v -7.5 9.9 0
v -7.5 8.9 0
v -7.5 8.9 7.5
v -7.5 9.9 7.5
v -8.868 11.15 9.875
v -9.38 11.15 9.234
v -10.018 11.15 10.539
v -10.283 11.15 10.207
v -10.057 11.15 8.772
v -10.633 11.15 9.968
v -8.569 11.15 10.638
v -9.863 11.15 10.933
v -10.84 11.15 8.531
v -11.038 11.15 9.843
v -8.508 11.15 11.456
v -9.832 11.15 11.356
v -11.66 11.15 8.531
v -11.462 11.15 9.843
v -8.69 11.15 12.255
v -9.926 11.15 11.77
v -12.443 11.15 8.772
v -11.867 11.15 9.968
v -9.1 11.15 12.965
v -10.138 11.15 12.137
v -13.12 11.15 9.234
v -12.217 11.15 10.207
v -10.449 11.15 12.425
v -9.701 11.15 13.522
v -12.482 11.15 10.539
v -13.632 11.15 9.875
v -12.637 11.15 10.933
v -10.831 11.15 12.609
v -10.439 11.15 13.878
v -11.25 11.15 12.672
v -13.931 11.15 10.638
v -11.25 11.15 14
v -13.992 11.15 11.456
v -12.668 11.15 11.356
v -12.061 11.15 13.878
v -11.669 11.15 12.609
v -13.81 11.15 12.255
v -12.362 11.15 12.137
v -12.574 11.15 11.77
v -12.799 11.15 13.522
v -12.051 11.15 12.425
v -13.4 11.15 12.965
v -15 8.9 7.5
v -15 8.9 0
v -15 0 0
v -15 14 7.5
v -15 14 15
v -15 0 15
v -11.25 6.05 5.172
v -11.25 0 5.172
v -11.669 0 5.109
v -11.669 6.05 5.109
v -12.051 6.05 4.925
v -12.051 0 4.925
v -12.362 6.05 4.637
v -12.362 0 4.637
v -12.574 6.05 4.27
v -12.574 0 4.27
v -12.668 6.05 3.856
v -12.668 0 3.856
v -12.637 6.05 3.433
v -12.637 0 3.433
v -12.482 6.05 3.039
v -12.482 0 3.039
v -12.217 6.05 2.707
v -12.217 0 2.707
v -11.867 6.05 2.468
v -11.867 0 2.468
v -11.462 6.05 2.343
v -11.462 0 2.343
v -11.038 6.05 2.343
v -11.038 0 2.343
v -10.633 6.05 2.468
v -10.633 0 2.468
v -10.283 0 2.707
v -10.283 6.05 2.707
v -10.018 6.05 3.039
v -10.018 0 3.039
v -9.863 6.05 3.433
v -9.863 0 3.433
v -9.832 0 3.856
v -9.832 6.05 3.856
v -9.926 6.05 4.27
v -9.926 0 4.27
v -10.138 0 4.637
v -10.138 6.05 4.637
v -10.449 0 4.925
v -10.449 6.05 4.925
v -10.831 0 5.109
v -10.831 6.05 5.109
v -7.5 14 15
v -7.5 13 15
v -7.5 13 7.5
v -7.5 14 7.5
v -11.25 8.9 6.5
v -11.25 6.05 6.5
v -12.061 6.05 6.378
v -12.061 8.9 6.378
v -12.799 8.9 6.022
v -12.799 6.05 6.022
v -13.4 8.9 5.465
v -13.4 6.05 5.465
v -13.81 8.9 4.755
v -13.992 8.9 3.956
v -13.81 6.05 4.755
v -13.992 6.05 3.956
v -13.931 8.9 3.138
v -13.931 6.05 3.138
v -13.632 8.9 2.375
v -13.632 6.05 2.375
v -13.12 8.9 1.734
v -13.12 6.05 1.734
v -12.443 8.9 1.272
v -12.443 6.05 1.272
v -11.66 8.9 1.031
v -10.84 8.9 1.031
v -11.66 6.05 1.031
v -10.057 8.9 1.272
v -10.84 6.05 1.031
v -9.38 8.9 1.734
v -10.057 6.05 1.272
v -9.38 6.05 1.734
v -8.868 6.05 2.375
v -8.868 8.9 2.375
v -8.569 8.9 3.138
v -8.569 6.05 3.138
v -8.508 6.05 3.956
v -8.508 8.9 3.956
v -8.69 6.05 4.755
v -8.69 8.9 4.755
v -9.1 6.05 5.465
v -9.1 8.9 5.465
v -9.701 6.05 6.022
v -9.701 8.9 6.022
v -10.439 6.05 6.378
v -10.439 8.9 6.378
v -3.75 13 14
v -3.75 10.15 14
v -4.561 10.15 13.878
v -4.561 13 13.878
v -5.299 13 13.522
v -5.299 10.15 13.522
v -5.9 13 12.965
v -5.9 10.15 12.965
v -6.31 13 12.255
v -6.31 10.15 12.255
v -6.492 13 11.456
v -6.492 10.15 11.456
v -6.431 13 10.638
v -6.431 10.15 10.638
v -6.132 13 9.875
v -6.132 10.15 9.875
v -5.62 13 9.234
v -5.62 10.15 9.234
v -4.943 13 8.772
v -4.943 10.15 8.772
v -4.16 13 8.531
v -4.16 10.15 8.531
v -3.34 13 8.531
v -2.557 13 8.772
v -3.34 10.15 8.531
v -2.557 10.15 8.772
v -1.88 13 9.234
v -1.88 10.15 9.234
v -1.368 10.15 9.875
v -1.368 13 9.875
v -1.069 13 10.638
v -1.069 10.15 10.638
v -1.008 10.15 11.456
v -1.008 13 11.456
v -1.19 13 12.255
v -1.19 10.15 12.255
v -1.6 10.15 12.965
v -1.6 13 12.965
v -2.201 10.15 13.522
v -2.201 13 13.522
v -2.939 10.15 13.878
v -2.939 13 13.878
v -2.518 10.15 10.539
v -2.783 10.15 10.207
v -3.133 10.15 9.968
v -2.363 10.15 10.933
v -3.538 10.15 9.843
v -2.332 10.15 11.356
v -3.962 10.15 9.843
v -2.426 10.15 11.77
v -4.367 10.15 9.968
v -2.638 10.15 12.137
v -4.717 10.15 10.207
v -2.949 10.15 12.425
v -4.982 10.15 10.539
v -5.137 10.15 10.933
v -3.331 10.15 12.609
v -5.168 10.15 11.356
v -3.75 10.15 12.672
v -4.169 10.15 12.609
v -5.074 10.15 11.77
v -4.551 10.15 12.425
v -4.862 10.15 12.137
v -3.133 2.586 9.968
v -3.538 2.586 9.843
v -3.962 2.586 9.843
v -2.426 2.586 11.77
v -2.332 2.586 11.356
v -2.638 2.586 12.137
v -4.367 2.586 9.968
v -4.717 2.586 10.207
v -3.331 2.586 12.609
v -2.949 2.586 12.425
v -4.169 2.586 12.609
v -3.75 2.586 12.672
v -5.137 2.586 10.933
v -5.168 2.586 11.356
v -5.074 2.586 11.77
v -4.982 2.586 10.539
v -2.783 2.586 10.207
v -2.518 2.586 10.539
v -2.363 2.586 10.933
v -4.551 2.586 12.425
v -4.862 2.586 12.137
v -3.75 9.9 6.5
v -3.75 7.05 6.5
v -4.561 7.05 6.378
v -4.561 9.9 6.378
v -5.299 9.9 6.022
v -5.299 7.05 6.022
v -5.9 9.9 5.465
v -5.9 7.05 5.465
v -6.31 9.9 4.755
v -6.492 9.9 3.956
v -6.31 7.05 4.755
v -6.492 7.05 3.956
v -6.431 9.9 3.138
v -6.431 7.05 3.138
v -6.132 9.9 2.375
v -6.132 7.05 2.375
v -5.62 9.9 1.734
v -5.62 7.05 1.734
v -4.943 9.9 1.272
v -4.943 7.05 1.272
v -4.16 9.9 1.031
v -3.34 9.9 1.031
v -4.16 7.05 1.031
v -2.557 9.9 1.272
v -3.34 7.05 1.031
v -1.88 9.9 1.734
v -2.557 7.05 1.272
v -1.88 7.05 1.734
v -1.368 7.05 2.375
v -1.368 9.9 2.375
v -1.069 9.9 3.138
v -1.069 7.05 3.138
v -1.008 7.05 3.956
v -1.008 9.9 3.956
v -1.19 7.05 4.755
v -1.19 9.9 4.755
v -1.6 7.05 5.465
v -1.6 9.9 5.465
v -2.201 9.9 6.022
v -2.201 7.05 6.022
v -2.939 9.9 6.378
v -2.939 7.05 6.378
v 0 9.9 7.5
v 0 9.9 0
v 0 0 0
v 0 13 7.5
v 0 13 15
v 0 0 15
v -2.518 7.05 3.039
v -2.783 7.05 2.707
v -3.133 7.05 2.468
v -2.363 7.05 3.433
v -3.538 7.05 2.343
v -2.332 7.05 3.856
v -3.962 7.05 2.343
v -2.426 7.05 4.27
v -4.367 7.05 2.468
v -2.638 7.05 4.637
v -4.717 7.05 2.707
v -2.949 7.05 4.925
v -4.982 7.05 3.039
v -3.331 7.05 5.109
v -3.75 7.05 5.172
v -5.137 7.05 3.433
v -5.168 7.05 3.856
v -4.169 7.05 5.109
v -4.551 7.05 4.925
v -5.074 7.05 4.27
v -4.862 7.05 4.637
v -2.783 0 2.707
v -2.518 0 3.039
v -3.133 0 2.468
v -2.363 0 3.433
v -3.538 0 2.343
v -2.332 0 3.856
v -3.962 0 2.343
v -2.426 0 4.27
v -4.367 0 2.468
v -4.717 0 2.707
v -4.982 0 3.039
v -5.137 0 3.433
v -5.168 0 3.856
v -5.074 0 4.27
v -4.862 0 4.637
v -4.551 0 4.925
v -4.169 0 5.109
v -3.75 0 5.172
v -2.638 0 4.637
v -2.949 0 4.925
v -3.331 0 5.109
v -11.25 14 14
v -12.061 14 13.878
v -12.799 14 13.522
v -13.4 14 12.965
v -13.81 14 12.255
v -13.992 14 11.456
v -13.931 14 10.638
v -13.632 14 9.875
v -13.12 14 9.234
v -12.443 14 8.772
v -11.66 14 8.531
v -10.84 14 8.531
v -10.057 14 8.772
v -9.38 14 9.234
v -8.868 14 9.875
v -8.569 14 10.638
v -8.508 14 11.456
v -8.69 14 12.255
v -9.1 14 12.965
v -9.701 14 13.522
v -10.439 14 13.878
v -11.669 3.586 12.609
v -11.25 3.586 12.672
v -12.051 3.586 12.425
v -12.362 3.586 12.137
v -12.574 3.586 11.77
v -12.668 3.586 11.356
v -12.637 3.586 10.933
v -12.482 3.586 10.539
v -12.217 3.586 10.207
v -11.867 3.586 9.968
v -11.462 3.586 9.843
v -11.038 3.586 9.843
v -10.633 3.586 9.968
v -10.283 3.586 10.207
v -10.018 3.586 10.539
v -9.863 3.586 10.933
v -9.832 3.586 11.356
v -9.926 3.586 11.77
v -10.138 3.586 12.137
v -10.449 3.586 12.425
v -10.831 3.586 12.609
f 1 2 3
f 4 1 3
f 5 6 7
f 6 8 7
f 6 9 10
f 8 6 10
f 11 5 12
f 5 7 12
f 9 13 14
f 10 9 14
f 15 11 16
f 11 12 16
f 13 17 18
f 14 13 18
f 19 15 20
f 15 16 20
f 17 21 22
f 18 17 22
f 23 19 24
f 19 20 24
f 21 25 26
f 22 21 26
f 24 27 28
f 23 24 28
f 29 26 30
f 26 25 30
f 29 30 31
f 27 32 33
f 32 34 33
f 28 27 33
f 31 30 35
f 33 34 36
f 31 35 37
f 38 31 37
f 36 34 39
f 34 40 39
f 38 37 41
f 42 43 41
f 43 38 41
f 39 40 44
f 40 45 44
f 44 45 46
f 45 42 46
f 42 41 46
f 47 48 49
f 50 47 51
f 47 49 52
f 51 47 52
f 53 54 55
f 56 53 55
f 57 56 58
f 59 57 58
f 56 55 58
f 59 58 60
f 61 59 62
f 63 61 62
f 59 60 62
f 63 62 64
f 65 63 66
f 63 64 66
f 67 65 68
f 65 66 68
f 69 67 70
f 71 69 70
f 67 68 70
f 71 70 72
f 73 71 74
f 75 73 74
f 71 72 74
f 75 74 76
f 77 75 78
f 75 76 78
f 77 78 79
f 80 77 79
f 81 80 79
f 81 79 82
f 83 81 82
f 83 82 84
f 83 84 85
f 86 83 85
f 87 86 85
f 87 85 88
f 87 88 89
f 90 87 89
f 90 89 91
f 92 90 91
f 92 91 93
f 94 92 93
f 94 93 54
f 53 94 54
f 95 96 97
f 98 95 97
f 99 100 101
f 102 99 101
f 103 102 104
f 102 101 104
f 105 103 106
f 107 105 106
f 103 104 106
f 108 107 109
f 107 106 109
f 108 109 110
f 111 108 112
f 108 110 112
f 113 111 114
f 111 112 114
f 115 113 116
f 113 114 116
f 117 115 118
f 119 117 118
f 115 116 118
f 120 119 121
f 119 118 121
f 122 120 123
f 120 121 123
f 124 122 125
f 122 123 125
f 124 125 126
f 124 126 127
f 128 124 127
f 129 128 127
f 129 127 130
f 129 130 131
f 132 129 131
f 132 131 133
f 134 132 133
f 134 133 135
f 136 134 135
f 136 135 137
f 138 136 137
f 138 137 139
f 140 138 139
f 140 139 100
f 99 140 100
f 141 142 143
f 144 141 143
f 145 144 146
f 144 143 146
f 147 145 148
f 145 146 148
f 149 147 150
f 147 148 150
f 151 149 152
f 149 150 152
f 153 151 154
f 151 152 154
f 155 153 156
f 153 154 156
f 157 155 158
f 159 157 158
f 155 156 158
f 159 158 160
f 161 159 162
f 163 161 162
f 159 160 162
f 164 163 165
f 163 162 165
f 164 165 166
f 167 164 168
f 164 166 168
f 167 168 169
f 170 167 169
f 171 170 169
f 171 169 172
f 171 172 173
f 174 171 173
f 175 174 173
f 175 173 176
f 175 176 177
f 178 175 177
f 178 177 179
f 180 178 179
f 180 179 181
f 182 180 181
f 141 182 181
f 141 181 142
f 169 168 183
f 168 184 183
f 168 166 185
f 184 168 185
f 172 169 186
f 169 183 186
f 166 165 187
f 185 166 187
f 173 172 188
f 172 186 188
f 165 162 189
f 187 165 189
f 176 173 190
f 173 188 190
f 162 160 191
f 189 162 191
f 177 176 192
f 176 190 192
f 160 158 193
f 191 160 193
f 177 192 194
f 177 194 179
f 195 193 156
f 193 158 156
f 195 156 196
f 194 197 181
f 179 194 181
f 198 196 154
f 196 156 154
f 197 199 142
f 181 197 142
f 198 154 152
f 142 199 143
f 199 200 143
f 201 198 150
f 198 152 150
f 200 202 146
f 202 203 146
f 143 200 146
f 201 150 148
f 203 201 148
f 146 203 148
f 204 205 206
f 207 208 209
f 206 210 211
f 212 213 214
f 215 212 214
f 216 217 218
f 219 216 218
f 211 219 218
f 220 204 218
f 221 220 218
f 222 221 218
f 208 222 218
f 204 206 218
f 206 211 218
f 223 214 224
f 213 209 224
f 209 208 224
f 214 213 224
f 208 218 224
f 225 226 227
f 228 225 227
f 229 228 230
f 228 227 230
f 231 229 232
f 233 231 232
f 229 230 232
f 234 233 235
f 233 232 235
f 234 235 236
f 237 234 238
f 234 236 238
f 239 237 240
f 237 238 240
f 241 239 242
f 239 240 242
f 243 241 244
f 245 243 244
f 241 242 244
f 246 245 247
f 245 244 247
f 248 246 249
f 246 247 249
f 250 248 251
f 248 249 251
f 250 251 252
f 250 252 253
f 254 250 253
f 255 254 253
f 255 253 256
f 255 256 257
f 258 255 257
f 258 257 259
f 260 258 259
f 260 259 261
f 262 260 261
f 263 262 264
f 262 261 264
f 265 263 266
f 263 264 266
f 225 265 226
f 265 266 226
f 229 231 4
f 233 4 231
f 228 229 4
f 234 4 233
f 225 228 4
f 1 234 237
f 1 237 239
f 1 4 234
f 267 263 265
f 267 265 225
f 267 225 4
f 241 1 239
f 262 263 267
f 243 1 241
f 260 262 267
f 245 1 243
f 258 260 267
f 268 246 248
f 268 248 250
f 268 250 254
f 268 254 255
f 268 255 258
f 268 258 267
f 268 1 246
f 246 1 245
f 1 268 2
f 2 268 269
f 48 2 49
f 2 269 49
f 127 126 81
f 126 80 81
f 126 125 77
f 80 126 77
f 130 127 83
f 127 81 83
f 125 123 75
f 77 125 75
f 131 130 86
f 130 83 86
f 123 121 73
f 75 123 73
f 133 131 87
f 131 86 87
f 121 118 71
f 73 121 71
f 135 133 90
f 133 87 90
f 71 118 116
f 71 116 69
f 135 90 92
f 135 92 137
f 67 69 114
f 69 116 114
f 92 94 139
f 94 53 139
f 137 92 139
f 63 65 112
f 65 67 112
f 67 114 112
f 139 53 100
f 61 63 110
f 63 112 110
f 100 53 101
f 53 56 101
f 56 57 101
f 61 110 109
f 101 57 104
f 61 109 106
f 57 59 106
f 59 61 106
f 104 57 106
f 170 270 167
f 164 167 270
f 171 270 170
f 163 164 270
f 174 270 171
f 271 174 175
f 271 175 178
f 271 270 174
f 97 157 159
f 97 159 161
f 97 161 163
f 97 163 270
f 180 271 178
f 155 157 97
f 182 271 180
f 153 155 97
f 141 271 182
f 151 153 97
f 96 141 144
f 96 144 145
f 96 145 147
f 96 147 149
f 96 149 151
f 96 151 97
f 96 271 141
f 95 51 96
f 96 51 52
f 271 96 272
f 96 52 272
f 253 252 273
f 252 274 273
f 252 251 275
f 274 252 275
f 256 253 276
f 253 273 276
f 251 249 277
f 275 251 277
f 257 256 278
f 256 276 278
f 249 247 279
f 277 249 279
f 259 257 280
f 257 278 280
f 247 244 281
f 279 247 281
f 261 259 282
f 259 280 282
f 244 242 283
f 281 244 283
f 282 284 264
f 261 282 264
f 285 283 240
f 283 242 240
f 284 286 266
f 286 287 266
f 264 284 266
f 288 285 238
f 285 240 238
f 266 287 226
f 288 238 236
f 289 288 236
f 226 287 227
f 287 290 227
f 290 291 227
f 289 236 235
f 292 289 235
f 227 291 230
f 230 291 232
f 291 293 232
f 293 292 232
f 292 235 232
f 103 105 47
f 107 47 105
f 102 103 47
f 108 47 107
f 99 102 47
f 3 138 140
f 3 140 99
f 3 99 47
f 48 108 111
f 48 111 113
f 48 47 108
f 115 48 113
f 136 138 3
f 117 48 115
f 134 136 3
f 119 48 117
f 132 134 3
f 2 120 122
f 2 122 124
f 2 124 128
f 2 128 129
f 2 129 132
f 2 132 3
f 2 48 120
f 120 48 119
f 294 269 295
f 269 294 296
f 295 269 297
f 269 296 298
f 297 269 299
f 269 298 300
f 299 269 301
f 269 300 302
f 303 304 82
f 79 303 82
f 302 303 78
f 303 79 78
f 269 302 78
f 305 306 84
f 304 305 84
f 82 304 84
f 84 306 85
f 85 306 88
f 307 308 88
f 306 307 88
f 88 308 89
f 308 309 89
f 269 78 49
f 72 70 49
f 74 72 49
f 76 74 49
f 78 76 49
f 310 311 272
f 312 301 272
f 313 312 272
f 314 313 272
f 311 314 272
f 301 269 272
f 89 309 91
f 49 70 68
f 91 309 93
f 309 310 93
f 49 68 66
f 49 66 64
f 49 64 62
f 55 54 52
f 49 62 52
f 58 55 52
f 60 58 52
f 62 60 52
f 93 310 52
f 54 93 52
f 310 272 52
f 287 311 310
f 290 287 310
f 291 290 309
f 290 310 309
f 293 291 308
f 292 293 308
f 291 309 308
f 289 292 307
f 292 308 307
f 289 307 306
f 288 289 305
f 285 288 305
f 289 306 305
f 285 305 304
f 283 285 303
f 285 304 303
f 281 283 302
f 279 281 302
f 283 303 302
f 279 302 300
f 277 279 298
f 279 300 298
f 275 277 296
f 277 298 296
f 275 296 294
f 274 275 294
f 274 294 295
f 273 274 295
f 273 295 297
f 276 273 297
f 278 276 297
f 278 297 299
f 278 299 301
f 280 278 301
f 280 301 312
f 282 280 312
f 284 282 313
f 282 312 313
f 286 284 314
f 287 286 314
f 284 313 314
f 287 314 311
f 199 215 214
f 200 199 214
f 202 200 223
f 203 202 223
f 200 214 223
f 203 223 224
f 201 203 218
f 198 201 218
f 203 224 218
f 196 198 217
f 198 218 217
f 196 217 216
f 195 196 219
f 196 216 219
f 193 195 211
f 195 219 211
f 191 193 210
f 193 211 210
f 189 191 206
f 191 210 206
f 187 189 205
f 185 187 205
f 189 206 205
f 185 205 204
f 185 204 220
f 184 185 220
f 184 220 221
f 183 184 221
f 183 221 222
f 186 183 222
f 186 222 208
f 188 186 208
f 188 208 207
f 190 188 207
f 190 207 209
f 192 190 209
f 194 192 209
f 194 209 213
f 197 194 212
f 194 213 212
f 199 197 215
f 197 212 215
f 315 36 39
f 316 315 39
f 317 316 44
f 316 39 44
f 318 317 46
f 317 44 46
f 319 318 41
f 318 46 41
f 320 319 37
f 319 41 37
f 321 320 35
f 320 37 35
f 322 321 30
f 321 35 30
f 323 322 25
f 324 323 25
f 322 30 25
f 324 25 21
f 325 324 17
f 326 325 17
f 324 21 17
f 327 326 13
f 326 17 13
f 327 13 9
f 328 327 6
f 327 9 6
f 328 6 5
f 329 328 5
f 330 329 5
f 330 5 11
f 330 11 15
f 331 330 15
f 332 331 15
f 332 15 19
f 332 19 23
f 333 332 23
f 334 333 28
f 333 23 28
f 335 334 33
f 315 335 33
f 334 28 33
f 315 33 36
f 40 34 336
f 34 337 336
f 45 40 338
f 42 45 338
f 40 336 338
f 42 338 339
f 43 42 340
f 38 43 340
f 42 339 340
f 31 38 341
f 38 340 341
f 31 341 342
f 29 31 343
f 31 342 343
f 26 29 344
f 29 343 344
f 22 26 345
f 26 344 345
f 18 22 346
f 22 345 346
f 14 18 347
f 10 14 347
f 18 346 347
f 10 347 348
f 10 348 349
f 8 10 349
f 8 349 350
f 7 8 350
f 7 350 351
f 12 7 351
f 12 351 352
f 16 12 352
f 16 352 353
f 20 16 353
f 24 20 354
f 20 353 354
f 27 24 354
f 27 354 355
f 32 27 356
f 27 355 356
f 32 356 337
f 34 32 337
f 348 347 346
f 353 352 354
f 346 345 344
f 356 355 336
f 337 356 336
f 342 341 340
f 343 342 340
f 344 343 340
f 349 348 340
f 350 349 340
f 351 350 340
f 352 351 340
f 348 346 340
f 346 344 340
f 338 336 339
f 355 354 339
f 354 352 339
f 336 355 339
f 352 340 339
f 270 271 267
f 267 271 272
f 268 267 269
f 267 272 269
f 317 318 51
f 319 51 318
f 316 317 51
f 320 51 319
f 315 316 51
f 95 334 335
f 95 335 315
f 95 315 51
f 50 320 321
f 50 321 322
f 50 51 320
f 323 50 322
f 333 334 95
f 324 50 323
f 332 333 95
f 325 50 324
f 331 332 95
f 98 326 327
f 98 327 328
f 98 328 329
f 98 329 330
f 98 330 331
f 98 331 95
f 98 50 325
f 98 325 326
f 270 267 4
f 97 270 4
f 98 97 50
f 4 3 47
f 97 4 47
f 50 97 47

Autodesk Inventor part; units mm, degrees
ref_plane "YZ Plane" through (0, 0, 0) normal (1, 0, 0) x (0, 1, 0)
ref_plane "XZ Plane" through (0, 0, 0) normal (0, 1, 0) x (-1, 0, 0)
ref_plane "XY Plane" through (0, 0, 0) normal (0, 0, 1) x (1, 0, 0)
sketch "Sketch1" plane through (0, 0, 0) normal (0, 1, 0) x (-1, 0, 0)
  line L0 (15, 15) -> (0, 15)
  line L1 (0, 15) -> (0, 0)
  line L2 (0, 0) -> (15, 0)
  line L3 (15, 0) -> (15, 15)
  dimension "d0" = 15
  dimension "d1" = 15
extrude "Extrusion1" add sketch "Sketch1" along normal blind 13
sketch "Sketch2" plane through (0, 13, 0) normal (0, 1, 0) x (1, 0, 0)
  line L0 (-15, -15) -> (0, -15) construction
  line L1 (0, -15) -> (0, 0) construction
  line L2 (0, 0) -> (-15, 0) construction
  line L3 (-15, 0) -> (-15, -15) construction
  line L4 (-15, 0) -> (-15, -15) construction
  line L5 (-15, -7.5) -> (0, -7.5) construction
  line L6 (-15, -7.5) -> (0, -7.5)
  line L7 (0, -7.5) -> (0, 0)
  line L8 (0, 0) -> (-15, 0)
  line L9 (-15, 0) -> (-15, -7.5)
extrude "Extrusion2" cut sketch "Sketch2" against normal blind 4.1
sketch "Sketch3" plane through (0, 13, 0) normal (0, 1, 0) x (1, 0, 0)
  line L0 (0, -7.5) -> (-15, -7.5) construction
  line L1 (-15, -7.5) -> (-15, -15) construction
  line L2 (-15, -15) -> (0, -15) construction
  line L3 (0, -15) -> (0, -7.5) construction
  line L4 (-15, -15) -> (0, -15) construction
  line L5 (-7.5, -15) -> (-7.5, -7.5) construction
  line L6 (-15, -15) -> (-7.5, -15)
  line L7 (-7.5, -15) -> (-7.5, -7.5)
  line L8 (-7.5, -7.5) -> (-15, -7.5)
  line L9 (-15, -7.5) -> (-15, -15)
  point P0 (0, 0)
extrude "Extrusion3" add sketch "Sketch3" along normal blind 1
sketch "Sketch4" plane through (0, 8.9, 0) normal (0, 1, 0) x (1, 0, 0)
  line L0 (0, 0) -> (0, -7.5) construction
  line L1 (-15, 0) -> (0, 0) construction
  line L2 (-15, -7.5) -> (-15, 0) construction
  line L3 (0, -7.5) -> (-15, -7.5) construction
  line L4 (-7.5, -7.5) -> (-7.5, 0) construction
  line L5 (-7.5, -7.5) -> (0, -7.5)
  line L6 (0, -7.5) -> (0, 0)
  line L7 (0, 0) -> (-7.5, 0)
  line L8 (-7.5, 0) -> (-7.5, -7.5)
extrude "Extrusion4" add sketch "Sketch4" along normal blind 1
sketch "Sketch5" plane through (0, 14, 0) normal (0, 1, 0) x (1, 0, 0)
  line L0 (-15, -15) -> (-7.5, -15) construction
  line L1 (-7.5, -15) -> (-7.5, -7.5) construction
  line L2 (-7.5, -7.5) -> (-15, -7.5) construction
  line L3 (-15, -7.5) -> (-15, -15) construction
  point P0 (0, 0)
  point P1 (-11.25, -11.25)
  point P2 (-11.25, -11.25)
sketch "Sketch6" plane through (0, 13, 0) normal (0, 1, 0) x (1, 0, 0)
  line L0 (-7.5, -7.5) -> (-7.5, -15) construction
  line L1 (-7.5, -15) -> (0, -15) construction
  line L2 (0, -15) -> (0, -7.5) construction
  line L3 (0, -7.5) -> (-7.5, -7.5) construction
  point P0 (0, 0)
  point P1 (-3.75, -11.25)
sketch "Sketch7" plane through (0, 9.9, 0) normal (0, 1, 0) x (1, 0, 0)
  line L0 (0, -7.5) -> (0, 0) construction
  line L1 (0, 0) -> (-7.5, 0) construction
  line L2 (-7.5, 0) -> (-7.5, -7.5) construction
  line L3 (0, -7.5) -> (-7.5, -7.5) construction
  point P0 (-3.75, -3.75)
sketch "Sketch8" plane through (0, 8.9, 0) normal (0, 1, 0) x (1, 0, 0)
  line L0 (-7.5, -7.5) -> (-7.5, 0) construction
  line L1 (-15, 0) -> (-7.5, 0) construction
  line L2 (-15, -7.5) -> (-15, 0) construction
  line L3 (-7.5, -7.5) -> (-15, -7.5) construction
  point P0 (0, 0)
  point P1 (-11.25, -3.75)
hole "Hole1" at (-11.25, 14, 11.25) direction (0, -1, 0) diameter 2.8448 depth 10.414 counterbore diameter 5.5 counterbore depth 2.85
hole "Hole2" at (-3.75, 13, 11.25) direction (0, -1, 0) diameter 2.8448 depth 10.414 counterbore diameter 5.5 counterbore depth 2.85
hole "Hole3" at (-11.25, 8.9, 3.75) direction (0, -1, 0) diameter 2.8448 depth 10.414 counterbore diameter 5.5 counterbore depth 2.85
hole "Hole4" at (-3.75, 9.9, 3.75) direction (0, -1, 0) diameter 2.8448 depth 10.414 counterbore diameter 5.5 counterbore depth 2.85
properties part number "screwprint"
